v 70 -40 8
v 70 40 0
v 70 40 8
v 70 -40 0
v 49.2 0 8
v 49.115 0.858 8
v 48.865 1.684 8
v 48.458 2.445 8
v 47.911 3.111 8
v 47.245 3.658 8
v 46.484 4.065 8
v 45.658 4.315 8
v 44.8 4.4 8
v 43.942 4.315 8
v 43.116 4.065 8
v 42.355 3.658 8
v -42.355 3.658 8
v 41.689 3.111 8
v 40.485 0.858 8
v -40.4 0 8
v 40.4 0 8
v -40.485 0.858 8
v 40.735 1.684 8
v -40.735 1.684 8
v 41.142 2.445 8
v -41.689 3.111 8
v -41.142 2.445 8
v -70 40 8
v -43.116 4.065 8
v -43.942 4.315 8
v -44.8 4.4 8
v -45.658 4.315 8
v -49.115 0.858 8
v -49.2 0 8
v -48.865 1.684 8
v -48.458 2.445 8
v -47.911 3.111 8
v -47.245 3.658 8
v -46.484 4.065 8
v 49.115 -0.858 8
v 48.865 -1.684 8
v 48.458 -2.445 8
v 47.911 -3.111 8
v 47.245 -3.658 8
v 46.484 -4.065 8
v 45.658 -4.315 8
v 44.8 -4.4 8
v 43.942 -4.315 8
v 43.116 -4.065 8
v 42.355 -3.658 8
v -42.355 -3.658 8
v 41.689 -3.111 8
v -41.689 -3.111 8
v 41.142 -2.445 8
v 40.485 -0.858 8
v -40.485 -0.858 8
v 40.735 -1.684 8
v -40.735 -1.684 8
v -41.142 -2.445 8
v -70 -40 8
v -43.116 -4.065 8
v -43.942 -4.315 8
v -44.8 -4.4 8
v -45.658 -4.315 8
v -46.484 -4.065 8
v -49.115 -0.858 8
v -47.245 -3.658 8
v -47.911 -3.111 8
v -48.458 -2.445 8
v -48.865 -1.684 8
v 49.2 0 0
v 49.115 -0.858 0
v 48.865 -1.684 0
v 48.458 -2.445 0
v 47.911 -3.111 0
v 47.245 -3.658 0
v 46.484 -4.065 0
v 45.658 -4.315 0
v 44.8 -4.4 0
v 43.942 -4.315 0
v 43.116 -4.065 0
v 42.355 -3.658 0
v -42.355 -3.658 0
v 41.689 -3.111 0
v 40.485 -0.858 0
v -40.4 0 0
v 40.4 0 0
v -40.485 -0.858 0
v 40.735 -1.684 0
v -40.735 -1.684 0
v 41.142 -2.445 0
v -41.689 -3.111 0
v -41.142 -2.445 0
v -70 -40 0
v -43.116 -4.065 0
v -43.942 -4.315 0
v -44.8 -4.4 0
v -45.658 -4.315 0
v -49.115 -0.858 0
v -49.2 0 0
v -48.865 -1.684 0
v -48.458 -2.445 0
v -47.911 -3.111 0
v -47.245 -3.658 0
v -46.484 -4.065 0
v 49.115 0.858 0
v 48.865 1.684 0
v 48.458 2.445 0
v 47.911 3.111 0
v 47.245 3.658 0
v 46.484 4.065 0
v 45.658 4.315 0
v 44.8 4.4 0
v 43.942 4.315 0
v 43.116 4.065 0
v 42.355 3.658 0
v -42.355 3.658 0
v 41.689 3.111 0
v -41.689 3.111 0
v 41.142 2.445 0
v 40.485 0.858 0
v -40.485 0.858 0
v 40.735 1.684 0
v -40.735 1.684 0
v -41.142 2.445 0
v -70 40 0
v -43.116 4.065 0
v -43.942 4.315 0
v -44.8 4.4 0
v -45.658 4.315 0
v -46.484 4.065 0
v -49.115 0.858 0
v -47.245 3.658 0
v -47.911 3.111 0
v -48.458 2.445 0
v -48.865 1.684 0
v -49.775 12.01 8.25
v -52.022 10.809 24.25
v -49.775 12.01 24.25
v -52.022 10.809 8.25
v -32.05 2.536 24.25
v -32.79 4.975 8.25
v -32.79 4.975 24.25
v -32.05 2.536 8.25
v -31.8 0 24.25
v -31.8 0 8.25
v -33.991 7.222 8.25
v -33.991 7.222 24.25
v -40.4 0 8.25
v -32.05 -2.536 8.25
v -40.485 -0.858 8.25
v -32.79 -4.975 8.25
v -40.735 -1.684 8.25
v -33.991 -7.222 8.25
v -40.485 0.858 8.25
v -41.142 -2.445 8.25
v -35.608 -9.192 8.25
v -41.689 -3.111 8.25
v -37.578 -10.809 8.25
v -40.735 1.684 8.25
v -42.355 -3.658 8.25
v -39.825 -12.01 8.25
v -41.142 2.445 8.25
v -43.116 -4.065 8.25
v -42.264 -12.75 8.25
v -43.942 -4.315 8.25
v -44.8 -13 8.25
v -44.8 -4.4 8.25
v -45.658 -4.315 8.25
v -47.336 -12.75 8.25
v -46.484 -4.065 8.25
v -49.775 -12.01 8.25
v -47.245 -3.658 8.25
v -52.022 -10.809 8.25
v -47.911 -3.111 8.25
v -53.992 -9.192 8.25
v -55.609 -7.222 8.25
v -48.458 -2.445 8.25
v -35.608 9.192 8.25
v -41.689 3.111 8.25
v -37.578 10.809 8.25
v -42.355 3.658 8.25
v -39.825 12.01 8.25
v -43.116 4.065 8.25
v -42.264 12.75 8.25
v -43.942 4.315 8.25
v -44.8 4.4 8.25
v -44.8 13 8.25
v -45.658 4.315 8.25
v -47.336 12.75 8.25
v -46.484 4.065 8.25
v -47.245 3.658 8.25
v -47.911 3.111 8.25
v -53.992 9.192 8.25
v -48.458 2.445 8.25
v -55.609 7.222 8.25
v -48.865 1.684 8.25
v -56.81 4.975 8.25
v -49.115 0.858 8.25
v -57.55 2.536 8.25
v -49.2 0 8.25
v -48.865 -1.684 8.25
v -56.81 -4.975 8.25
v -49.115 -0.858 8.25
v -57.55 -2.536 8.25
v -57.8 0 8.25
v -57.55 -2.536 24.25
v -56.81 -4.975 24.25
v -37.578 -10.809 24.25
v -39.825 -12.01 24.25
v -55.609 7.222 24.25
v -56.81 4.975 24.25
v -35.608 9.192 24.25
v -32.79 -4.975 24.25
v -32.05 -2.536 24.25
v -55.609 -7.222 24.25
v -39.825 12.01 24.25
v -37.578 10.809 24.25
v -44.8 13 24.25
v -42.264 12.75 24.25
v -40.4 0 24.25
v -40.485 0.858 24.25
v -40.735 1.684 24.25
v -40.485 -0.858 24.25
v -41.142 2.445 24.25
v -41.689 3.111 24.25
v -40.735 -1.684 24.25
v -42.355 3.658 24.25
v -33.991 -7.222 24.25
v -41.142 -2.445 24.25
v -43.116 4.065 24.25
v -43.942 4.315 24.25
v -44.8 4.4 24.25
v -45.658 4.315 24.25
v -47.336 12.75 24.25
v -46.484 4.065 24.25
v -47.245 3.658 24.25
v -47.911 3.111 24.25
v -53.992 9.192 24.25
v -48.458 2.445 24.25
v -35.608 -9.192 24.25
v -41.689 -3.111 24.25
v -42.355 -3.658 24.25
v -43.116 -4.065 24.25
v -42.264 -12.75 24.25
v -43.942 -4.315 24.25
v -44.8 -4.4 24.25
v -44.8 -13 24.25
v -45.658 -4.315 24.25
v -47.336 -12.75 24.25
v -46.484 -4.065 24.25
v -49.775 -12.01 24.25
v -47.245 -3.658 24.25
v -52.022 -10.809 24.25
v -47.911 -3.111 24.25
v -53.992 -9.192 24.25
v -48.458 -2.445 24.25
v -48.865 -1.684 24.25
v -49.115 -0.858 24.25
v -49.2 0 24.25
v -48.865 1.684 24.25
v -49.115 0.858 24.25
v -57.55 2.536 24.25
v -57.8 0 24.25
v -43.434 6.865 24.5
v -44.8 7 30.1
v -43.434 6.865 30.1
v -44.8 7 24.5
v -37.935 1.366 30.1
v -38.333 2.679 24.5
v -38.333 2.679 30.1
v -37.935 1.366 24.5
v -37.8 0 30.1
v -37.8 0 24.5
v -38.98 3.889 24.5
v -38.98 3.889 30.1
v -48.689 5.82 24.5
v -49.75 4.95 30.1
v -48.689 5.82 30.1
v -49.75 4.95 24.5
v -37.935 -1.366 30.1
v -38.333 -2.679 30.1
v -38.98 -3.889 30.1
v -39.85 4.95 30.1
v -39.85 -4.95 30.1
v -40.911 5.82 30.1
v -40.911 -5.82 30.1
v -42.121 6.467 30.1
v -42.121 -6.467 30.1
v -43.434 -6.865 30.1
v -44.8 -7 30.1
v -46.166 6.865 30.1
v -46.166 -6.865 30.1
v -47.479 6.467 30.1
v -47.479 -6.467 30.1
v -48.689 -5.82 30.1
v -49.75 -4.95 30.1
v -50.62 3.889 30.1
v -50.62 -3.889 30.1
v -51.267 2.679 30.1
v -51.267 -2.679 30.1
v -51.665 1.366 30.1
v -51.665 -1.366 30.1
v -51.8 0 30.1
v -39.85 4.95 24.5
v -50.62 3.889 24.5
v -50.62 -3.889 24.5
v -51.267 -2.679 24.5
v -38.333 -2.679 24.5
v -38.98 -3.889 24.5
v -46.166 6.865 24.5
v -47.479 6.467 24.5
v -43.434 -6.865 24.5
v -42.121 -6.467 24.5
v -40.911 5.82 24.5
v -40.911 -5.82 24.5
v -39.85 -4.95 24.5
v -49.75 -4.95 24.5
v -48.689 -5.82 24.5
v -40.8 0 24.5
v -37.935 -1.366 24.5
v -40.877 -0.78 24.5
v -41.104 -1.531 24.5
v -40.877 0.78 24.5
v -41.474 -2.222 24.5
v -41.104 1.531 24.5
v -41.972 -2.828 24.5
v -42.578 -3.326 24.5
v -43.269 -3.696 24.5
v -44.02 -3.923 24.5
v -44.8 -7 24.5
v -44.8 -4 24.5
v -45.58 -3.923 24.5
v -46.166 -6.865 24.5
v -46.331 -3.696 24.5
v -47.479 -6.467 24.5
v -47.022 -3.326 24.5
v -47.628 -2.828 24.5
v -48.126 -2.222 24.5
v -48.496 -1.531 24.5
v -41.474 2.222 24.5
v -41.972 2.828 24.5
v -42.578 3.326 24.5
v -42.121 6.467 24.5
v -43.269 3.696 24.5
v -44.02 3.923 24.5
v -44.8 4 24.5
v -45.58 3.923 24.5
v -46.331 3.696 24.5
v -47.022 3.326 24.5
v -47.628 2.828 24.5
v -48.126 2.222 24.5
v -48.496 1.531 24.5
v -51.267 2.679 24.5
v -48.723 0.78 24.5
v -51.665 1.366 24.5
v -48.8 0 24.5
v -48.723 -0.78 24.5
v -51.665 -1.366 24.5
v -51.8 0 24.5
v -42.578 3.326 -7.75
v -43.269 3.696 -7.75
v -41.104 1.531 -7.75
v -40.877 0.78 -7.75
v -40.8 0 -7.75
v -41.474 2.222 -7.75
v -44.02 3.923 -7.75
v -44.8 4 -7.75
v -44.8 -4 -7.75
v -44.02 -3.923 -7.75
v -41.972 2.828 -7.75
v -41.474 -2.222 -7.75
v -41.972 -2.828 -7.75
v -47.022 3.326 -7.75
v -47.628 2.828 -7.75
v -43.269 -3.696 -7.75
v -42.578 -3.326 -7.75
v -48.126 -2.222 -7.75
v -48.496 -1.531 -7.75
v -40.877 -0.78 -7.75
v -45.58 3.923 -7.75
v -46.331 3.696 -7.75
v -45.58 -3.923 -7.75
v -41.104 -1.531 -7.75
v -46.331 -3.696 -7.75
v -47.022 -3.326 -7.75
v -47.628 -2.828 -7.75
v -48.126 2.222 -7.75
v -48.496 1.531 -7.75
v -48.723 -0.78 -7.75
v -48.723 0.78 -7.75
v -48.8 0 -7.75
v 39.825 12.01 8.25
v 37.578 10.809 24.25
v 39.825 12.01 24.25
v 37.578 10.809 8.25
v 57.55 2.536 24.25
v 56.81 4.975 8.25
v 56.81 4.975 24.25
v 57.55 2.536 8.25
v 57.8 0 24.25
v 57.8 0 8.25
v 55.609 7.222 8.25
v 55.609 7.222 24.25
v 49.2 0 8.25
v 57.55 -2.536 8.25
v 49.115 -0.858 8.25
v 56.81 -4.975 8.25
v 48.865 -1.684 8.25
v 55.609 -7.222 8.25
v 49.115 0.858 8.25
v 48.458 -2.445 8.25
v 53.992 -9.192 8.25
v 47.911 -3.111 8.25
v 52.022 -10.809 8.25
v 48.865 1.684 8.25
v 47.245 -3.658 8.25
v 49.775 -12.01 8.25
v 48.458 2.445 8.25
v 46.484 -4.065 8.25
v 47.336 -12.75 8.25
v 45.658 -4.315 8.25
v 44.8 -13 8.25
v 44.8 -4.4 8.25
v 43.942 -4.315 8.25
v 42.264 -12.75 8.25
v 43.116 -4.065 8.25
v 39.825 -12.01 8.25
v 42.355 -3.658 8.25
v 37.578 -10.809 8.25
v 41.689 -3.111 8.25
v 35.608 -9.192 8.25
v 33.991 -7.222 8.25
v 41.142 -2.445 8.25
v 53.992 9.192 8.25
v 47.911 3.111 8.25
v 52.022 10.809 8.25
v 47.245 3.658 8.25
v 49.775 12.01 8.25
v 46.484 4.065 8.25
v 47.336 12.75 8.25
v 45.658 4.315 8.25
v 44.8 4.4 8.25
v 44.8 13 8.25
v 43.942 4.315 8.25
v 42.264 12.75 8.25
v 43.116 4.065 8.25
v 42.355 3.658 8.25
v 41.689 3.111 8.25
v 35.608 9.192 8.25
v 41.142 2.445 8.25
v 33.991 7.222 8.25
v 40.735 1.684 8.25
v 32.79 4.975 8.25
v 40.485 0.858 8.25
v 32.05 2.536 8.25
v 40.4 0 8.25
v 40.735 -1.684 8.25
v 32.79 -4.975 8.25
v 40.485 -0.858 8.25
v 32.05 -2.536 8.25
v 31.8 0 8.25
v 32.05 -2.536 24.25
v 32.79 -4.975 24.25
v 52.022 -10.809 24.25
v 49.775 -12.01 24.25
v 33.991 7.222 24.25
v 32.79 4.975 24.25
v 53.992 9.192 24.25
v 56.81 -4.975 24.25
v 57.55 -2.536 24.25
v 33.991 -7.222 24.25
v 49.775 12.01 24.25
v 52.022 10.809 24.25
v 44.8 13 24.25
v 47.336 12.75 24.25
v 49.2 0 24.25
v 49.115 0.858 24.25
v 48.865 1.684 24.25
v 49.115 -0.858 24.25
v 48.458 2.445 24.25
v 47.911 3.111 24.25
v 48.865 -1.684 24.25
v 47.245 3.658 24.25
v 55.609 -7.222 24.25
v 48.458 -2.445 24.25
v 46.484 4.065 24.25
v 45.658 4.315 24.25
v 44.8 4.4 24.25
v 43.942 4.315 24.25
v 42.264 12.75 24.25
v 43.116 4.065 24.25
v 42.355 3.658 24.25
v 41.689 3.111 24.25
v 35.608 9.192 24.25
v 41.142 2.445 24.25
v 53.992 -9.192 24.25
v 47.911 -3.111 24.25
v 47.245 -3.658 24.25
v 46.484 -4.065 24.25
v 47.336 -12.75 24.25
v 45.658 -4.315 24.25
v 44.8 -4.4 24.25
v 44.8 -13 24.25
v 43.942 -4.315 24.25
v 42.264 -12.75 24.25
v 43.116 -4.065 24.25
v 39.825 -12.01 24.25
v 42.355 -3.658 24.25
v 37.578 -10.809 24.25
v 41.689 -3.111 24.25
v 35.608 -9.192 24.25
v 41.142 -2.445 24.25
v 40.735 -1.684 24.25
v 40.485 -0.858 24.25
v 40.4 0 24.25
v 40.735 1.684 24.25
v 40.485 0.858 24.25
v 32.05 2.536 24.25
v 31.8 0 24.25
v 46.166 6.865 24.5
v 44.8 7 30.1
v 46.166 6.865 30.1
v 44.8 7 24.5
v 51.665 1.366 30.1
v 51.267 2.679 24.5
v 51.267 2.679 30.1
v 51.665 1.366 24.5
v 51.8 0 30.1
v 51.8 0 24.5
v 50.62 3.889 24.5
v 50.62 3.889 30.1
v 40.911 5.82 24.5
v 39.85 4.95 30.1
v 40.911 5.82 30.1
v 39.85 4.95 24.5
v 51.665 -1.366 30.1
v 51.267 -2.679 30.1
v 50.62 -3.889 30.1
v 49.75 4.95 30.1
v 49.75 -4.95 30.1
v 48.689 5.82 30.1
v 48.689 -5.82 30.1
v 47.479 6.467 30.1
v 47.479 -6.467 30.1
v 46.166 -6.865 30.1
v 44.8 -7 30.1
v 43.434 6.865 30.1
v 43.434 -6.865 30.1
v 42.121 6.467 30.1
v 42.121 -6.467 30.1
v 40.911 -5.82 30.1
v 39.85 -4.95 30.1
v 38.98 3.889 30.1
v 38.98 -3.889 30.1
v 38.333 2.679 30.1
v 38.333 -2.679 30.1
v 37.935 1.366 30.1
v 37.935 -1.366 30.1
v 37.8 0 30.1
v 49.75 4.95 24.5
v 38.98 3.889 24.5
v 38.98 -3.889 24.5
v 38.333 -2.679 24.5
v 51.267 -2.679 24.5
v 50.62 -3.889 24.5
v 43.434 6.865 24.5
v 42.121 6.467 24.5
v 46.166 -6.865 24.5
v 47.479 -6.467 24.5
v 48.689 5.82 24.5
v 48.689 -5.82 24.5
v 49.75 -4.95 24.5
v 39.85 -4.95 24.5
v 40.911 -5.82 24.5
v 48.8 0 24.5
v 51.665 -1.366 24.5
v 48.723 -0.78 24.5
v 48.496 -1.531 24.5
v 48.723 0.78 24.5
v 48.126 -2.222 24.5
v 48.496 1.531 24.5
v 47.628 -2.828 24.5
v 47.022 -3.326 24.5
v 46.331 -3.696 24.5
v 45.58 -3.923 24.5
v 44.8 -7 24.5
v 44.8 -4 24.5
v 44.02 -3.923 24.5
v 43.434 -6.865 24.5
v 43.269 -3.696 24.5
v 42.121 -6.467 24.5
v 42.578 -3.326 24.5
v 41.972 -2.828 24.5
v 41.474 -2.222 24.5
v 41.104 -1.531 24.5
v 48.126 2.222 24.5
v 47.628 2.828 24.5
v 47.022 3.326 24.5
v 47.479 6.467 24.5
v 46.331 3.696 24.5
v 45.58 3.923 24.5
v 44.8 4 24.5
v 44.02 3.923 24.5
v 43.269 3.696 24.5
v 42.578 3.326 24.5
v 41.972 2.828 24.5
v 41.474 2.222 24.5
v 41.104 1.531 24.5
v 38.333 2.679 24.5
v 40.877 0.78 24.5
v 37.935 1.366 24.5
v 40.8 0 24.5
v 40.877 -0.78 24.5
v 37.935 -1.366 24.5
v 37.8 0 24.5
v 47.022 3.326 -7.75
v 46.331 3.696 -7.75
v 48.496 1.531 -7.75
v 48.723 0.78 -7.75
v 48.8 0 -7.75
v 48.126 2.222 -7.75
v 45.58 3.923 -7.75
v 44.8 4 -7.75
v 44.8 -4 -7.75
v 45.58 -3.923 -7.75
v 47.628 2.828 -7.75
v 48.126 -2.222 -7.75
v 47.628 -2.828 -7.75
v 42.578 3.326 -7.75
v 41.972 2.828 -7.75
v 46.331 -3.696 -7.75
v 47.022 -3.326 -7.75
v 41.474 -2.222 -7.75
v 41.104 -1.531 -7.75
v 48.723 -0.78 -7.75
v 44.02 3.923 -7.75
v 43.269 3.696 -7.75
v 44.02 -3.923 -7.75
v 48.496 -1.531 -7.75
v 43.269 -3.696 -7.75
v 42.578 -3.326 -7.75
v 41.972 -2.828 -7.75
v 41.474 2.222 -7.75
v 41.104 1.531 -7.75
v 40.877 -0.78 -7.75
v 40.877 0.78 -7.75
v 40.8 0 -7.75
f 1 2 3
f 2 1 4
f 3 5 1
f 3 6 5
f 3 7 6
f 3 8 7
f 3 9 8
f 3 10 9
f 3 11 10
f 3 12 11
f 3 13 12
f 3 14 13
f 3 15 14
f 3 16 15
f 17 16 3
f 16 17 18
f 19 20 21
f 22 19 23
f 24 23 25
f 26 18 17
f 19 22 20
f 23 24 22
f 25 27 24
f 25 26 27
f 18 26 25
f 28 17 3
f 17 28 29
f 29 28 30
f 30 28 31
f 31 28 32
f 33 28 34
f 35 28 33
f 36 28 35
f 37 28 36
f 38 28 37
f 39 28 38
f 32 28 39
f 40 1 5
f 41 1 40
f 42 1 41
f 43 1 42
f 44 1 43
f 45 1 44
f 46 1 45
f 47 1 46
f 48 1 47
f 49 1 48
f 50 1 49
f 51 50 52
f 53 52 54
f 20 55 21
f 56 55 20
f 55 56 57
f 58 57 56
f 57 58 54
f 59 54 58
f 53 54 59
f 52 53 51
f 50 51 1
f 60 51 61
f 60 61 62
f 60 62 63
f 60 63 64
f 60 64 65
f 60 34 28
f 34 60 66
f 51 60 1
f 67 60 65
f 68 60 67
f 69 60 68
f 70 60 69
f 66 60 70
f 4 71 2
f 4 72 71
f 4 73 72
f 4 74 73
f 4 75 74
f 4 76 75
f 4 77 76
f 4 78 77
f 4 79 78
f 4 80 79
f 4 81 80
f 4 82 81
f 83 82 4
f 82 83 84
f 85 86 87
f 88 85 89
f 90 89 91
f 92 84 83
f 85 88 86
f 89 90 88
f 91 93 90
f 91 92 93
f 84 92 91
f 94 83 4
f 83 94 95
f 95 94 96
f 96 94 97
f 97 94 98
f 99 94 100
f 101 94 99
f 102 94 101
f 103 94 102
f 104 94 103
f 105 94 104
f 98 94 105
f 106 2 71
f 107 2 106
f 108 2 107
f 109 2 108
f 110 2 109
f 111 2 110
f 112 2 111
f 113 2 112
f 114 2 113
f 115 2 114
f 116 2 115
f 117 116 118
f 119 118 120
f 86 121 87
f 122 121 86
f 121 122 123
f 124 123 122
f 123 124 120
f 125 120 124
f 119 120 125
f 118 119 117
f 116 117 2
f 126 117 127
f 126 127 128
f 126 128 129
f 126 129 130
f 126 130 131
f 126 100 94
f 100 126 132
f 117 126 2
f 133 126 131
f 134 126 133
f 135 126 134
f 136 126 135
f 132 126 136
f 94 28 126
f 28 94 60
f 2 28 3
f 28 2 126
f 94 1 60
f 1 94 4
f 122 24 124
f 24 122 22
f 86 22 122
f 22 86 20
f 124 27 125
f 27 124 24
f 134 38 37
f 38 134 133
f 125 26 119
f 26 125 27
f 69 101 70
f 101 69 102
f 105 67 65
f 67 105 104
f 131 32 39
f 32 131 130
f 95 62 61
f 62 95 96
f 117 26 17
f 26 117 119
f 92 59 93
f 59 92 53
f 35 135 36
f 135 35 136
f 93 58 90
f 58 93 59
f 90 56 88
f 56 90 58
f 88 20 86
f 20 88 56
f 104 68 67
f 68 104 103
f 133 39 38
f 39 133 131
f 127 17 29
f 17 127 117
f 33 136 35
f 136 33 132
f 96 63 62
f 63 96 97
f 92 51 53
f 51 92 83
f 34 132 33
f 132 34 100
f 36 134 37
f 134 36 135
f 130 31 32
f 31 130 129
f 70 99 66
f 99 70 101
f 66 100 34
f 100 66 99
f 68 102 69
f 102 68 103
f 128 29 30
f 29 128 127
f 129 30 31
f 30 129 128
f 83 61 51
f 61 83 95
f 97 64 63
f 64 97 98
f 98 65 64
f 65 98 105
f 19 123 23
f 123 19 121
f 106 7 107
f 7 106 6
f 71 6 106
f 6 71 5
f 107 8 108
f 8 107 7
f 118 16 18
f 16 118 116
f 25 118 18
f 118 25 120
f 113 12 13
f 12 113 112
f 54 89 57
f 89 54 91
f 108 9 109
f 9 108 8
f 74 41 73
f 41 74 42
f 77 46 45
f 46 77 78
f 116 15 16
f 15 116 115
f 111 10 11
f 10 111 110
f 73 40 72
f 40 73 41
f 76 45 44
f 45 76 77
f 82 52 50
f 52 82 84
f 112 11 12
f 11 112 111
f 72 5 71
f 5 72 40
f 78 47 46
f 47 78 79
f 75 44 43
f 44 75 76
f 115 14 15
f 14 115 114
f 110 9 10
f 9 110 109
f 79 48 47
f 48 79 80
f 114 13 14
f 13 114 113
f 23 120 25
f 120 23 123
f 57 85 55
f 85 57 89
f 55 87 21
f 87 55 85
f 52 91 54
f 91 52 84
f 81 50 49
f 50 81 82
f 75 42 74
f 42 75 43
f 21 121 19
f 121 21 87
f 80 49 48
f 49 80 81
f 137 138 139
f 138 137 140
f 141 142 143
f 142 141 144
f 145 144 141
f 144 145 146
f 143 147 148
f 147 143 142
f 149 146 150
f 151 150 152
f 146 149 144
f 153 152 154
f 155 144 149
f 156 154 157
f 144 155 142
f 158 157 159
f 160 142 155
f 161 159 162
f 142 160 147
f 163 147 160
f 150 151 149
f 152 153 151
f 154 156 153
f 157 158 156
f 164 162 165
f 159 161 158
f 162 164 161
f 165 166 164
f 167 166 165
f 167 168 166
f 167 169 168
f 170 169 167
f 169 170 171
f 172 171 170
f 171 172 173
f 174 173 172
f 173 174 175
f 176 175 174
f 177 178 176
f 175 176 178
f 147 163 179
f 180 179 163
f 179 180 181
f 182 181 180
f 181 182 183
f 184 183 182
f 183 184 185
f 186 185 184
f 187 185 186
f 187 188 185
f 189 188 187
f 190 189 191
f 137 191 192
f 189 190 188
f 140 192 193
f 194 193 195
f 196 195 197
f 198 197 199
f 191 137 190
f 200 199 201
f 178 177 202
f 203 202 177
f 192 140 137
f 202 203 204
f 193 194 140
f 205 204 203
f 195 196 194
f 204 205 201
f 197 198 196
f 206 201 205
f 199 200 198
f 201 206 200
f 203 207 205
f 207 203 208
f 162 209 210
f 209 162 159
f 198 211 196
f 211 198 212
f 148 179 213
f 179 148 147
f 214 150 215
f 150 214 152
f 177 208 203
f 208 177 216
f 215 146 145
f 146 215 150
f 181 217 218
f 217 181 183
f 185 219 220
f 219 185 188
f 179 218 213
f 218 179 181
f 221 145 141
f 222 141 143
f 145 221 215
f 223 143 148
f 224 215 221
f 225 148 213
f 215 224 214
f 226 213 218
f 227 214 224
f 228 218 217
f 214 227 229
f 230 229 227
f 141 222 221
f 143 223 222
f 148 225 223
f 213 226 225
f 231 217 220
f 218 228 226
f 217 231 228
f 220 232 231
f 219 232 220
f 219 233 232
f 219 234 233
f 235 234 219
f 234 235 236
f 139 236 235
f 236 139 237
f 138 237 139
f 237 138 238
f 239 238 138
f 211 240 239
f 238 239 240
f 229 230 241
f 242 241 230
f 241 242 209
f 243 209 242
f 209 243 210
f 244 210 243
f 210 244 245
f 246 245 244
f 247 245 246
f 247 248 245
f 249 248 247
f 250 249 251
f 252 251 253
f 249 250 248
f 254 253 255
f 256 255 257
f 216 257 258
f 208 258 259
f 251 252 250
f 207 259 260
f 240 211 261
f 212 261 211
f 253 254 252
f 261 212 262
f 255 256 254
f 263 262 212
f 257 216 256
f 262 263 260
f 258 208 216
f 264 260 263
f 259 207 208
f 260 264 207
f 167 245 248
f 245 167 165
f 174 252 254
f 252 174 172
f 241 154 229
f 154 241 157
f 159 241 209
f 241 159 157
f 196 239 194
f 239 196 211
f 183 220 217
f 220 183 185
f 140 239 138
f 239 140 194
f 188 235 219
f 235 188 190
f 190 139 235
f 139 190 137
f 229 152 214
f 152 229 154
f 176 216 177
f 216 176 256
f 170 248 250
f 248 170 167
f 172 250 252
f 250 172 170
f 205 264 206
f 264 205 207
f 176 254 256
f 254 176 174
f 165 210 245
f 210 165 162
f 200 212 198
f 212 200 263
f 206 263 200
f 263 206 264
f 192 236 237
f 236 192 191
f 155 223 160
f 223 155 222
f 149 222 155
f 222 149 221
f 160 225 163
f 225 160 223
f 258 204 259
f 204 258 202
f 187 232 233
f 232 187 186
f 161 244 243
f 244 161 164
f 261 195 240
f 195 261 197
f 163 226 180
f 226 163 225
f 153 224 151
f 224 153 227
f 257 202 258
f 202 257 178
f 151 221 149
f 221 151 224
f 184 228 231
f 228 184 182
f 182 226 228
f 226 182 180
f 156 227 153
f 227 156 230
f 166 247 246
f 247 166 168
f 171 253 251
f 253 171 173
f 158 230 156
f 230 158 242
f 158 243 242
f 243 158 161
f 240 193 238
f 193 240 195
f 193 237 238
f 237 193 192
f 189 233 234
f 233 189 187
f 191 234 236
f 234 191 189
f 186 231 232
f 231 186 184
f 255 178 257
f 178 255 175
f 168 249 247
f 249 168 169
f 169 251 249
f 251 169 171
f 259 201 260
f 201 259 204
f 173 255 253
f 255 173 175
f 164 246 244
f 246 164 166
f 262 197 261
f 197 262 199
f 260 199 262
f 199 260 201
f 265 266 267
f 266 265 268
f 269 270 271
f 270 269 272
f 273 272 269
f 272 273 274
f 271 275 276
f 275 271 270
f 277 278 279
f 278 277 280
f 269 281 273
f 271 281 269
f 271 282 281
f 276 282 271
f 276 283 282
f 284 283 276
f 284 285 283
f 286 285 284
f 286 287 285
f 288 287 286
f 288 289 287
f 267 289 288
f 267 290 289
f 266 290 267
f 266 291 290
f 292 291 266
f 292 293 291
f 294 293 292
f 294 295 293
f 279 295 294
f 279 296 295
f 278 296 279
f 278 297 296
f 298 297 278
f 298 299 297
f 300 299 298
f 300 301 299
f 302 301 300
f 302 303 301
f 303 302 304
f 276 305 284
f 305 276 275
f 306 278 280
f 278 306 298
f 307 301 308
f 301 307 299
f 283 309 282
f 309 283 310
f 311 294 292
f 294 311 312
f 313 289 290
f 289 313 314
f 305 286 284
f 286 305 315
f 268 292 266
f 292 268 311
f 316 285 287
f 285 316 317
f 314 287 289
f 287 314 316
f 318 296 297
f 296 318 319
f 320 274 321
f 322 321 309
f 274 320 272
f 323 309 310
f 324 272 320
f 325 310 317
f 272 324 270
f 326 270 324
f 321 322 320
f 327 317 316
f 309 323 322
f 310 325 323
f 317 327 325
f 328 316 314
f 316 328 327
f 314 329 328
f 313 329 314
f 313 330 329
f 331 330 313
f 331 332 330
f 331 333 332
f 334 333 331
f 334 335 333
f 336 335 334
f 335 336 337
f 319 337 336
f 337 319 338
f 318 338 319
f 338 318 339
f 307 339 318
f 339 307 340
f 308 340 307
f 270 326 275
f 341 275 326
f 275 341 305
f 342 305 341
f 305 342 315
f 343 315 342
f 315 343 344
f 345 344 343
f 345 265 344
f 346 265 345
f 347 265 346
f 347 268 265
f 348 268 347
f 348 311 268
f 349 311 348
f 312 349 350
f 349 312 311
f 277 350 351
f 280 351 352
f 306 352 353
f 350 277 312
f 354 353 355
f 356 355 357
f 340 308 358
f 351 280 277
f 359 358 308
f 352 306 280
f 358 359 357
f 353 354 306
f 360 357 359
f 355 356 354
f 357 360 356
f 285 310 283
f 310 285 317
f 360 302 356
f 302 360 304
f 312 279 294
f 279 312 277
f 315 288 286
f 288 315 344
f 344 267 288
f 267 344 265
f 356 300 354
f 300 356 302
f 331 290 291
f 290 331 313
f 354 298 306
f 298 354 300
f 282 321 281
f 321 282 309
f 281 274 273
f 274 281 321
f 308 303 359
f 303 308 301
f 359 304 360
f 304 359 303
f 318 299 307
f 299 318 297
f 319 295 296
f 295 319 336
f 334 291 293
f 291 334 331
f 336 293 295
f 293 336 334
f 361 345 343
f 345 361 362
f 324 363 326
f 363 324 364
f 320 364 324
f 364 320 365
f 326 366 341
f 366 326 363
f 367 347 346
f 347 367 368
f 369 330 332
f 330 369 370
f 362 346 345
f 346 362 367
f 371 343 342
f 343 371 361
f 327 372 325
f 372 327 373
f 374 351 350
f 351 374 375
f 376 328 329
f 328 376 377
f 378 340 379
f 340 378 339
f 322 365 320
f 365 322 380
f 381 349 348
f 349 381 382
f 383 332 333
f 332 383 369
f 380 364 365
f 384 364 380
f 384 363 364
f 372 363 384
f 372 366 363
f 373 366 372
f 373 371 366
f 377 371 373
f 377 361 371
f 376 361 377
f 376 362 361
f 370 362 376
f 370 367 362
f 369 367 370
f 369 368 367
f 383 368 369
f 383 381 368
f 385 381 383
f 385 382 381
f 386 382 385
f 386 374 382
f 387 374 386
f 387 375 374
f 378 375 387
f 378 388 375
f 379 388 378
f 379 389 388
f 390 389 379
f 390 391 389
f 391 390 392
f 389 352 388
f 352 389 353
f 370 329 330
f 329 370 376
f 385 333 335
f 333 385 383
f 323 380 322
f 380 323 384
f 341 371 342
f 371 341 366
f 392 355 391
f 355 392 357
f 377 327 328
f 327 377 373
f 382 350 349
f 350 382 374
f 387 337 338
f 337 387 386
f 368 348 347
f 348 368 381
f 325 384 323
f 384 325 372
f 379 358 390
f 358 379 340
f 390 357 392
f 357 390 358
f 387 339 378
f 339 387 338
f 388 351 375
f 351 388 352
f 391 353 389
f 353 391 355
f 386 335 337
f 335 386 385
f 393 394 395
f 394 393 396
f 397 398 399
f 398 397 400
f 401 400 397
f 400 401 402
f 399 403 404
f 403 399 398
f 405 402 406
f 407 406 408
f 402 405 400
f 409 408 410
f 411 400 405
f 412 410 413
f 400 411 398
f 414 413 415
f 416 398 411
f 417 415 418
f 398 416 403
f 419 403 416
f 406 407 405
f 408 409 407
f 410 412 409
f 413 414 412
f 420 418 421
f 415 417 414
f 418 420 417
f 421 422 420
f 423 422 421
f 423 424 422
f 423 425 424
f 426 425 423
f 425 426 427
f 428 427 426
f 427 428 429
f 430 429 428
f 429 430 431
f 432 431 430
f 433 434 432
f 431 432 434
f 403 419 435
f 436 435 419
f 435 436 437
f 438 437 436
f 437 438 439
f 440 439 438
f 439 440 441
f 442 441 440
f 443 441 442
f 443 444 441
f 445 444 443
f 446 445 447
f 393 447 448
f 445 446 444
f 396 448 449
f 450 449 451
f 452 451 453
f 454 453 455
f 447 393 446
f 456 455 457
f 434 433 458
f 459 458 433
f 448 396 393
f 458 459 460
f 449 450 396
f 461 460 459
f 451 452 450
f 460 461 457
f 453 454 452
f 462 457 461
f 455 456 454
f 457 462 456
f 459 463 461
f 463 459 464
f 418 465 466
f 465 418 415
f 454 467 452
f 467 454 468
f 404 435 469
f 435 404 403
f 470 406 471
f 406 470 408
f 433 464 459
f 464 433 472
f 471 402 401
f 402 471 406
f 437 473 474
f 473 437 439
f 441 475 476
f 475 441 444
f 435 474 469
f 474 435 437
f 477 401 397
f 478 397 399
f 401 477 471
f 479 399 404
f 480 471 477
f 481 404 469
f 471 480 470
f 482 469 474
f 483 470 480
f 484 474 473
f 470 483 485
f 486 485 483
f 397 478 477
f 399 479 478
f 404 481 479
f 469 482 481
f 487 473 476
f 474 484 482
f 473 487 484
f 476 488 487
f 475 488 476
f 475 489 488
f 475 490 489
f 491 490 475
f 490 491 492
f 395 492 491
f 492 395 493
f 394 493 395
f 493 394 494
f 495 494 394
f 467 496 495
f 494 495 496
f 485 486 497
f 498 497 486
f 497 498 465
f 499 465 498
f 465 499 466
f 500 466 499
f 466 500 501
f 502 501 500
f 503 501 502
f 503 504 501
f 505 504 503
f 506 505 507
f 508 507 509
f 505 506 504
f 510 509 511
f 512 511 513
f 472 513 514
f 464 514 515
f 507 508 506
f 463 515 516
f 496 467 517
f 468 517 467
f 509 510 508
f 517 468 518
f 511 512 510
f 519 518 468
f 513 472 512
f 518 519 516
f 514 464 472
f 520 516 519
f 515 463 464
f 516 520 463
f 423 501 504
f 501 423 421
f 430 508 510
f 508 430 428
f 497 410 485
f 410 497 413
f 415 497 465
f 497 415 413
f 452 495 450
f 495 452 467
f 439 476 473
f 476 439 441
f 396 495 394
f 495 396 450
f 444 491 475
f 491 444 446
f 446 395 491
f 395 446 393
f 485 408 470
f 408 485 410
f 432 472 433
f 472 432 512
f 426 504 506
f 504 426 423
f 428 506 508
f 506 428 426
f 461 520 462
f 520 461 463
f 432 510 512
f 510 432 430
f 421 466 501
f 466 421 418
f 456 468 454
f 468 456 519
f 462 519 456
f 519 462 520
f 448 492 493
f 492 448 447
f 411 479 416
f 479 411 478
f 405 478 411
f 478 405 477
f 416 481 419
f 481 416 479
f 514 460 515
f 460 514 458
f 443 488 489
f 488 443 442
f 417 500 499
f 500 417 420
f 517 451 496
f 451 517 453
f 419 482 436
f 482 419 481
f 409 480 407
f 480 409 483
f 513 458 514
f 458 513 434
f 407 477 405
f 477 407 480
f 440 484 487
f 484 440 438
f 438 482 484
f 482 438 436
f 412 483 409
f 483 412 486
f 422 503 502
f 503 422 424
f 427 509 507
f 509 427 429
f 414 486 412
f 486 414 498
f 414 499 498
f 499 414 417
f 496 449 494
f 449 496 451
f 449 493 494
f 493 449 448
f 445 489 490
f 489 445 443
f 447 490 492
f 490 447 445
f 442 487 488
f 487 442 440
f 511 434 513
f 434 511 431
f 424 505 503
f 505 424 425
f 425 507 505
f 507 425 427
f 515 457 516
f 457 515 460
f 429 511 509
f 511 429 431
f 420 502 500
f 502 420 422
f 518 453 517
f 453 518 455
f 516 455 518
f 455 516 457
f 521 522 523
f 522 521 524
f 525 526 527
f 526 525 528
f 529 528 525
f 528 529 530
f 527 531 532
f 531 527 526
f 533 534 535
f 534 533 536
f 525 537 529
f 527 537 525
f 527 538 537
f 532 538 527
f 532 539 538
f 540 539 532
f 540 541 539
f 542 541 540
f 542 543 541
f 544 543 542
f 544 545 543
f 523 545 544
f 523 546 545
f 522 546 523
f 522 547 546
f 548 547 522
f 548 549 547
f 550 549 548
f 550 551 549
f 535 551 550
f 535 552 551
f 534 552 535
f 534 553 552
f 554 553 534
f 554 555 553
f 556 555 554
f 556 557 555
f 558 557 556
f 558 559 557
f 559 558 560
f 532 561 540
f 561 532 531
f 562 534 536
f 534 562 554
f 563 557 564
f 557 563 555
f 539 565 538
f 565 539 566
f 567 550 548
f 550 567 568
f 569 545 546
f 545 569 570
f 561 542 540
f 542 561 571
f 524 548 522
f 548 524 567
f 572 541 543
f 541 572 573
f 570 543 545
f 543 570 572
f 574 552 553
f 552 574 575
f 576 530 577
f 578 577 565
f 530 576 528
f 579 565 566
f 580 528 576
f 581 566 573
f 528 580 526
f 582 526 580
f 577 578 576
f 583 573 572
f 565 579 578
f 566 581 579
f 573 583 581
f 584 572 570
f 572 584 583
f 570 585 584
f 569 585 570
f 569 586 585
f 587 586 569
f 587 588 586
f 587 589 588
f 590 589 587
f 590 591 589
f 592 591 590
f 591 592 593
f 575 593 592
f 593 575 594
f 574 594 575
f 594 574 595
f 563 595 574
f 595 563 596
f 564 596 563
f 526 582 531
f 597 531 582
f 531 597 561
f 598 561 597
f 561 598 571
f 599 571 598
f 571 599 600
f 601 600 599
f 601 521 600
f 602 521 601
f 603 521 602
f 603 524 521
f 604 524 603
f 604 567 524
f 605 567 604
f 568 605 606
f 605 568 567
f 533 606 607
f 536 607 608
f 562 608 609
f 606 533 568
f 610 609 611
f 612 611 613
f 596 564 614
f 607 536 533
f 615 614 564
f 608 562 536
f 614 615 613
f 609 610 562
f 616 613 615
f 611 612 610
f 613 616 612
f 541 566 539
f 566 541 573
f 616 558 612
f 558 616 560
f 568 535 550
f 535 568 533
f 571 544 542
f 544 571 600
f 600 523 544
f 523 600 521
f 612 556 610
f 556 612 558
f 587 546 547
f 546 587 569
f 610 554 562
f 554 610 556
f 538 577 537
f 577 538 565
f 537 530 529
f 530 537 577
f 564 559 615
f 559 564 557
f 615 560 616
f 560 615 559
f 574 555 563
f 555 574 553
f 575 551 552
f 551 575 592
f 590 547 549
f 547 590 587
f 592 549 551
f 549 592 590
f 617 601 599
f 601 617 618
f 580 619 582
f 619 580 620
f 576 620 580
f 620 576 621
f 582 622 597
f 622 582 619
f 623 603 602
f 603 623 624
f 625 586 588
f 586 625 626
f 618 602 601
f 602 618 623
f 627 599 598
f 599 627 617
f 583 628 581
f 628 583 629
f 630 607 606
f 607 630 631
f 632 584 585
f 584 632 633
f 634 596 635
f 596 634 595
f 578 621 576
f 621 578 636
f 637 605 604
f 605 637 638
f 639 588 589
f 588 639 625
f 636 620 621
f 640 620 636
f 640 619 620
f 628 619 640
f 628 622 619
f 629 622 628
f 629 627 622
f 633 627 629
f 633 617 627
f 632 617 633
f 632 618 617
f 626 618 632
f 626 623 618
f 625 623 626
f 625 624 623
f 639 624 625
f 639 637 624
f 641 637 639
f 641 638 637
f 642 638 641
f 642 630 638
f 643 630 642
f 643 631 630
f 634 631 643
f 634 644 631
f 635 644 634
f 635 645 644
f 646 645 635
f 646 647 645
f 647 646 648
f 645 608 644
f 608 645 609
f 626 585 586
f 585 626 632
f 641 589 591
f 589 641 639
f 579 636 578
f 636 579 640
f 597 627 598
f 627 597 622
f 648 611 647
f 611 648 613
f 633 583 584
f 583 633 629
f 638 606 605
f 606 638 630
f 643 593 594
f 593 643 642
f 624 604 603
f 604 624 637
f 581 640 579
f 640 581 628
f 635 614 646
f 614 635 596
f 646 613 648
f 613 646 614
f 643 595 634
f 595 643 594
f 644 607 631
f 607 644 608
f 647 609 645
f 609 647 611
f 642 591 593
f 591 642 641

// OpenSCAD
$fn = 32;

// ------------------------------------------------------------------------
// Standoff columns: 2 d26 standoffs, bolts d8
// Every part is its own module, assembly() places them once.
// ------------------------------------------------------------------------

// --- part 1 ---
module base_plate() {
  difference() {
    translate([-70, -40, 0]) cube([140, 80, 8]);
    translate([-44.8, 0, -1]) cylinder(h = 10, d = 8.8);
    translate([44.8, 0, -1]) cylinder(h = 10, d = 8.8);
  }
}

// --- part 2 ---
module spacer1() {
  difference() {
      translate([0, 0, 0]) cylinder(h = 16, d = 26);
      translate([0, 0, -1]) cylinder(h = 18, d = 8.8);
    }
}

// --- part 3 ---
module bolt1() {
  cylinder(h = 5.6, d = 14);
  translate([0, 0, -32.25]) cylinder(h = 32.25, d = 8);
}

// --- part 4 ---
module spacer2() {
  difference() {
      translate([0, 0, 0]) cylinder(h = 16, d = 26);
      translate([0, 0, -1]) cylinder(h = 18, d = 8.8);
    }
}

// --- part 5 ---
module bolt2() {
  cylinder(h = 5.6, d = 14);
  translate([0, 0, -32.25]) cylinder(h = 32.25, d = 8);
}

// --- assembly ---
module assembly() {
  translate([0, 0, 0]) rotate([0, 0, 0]) base_plate();
  translate([-44.8, 0, 8.25]) rotate([0, 0, 0]) spacer1();
  translate([-44.8, 0, 24.5]) rotate([0, 0, 0]) bolt1();
  translate([44.8, 0, 8.25]) rotate([0, 0, 0]) spacer2();
  translate([44.8, 0, 24.5]) rotate([0, 0, 0]) bolt2();
}

assembly();
